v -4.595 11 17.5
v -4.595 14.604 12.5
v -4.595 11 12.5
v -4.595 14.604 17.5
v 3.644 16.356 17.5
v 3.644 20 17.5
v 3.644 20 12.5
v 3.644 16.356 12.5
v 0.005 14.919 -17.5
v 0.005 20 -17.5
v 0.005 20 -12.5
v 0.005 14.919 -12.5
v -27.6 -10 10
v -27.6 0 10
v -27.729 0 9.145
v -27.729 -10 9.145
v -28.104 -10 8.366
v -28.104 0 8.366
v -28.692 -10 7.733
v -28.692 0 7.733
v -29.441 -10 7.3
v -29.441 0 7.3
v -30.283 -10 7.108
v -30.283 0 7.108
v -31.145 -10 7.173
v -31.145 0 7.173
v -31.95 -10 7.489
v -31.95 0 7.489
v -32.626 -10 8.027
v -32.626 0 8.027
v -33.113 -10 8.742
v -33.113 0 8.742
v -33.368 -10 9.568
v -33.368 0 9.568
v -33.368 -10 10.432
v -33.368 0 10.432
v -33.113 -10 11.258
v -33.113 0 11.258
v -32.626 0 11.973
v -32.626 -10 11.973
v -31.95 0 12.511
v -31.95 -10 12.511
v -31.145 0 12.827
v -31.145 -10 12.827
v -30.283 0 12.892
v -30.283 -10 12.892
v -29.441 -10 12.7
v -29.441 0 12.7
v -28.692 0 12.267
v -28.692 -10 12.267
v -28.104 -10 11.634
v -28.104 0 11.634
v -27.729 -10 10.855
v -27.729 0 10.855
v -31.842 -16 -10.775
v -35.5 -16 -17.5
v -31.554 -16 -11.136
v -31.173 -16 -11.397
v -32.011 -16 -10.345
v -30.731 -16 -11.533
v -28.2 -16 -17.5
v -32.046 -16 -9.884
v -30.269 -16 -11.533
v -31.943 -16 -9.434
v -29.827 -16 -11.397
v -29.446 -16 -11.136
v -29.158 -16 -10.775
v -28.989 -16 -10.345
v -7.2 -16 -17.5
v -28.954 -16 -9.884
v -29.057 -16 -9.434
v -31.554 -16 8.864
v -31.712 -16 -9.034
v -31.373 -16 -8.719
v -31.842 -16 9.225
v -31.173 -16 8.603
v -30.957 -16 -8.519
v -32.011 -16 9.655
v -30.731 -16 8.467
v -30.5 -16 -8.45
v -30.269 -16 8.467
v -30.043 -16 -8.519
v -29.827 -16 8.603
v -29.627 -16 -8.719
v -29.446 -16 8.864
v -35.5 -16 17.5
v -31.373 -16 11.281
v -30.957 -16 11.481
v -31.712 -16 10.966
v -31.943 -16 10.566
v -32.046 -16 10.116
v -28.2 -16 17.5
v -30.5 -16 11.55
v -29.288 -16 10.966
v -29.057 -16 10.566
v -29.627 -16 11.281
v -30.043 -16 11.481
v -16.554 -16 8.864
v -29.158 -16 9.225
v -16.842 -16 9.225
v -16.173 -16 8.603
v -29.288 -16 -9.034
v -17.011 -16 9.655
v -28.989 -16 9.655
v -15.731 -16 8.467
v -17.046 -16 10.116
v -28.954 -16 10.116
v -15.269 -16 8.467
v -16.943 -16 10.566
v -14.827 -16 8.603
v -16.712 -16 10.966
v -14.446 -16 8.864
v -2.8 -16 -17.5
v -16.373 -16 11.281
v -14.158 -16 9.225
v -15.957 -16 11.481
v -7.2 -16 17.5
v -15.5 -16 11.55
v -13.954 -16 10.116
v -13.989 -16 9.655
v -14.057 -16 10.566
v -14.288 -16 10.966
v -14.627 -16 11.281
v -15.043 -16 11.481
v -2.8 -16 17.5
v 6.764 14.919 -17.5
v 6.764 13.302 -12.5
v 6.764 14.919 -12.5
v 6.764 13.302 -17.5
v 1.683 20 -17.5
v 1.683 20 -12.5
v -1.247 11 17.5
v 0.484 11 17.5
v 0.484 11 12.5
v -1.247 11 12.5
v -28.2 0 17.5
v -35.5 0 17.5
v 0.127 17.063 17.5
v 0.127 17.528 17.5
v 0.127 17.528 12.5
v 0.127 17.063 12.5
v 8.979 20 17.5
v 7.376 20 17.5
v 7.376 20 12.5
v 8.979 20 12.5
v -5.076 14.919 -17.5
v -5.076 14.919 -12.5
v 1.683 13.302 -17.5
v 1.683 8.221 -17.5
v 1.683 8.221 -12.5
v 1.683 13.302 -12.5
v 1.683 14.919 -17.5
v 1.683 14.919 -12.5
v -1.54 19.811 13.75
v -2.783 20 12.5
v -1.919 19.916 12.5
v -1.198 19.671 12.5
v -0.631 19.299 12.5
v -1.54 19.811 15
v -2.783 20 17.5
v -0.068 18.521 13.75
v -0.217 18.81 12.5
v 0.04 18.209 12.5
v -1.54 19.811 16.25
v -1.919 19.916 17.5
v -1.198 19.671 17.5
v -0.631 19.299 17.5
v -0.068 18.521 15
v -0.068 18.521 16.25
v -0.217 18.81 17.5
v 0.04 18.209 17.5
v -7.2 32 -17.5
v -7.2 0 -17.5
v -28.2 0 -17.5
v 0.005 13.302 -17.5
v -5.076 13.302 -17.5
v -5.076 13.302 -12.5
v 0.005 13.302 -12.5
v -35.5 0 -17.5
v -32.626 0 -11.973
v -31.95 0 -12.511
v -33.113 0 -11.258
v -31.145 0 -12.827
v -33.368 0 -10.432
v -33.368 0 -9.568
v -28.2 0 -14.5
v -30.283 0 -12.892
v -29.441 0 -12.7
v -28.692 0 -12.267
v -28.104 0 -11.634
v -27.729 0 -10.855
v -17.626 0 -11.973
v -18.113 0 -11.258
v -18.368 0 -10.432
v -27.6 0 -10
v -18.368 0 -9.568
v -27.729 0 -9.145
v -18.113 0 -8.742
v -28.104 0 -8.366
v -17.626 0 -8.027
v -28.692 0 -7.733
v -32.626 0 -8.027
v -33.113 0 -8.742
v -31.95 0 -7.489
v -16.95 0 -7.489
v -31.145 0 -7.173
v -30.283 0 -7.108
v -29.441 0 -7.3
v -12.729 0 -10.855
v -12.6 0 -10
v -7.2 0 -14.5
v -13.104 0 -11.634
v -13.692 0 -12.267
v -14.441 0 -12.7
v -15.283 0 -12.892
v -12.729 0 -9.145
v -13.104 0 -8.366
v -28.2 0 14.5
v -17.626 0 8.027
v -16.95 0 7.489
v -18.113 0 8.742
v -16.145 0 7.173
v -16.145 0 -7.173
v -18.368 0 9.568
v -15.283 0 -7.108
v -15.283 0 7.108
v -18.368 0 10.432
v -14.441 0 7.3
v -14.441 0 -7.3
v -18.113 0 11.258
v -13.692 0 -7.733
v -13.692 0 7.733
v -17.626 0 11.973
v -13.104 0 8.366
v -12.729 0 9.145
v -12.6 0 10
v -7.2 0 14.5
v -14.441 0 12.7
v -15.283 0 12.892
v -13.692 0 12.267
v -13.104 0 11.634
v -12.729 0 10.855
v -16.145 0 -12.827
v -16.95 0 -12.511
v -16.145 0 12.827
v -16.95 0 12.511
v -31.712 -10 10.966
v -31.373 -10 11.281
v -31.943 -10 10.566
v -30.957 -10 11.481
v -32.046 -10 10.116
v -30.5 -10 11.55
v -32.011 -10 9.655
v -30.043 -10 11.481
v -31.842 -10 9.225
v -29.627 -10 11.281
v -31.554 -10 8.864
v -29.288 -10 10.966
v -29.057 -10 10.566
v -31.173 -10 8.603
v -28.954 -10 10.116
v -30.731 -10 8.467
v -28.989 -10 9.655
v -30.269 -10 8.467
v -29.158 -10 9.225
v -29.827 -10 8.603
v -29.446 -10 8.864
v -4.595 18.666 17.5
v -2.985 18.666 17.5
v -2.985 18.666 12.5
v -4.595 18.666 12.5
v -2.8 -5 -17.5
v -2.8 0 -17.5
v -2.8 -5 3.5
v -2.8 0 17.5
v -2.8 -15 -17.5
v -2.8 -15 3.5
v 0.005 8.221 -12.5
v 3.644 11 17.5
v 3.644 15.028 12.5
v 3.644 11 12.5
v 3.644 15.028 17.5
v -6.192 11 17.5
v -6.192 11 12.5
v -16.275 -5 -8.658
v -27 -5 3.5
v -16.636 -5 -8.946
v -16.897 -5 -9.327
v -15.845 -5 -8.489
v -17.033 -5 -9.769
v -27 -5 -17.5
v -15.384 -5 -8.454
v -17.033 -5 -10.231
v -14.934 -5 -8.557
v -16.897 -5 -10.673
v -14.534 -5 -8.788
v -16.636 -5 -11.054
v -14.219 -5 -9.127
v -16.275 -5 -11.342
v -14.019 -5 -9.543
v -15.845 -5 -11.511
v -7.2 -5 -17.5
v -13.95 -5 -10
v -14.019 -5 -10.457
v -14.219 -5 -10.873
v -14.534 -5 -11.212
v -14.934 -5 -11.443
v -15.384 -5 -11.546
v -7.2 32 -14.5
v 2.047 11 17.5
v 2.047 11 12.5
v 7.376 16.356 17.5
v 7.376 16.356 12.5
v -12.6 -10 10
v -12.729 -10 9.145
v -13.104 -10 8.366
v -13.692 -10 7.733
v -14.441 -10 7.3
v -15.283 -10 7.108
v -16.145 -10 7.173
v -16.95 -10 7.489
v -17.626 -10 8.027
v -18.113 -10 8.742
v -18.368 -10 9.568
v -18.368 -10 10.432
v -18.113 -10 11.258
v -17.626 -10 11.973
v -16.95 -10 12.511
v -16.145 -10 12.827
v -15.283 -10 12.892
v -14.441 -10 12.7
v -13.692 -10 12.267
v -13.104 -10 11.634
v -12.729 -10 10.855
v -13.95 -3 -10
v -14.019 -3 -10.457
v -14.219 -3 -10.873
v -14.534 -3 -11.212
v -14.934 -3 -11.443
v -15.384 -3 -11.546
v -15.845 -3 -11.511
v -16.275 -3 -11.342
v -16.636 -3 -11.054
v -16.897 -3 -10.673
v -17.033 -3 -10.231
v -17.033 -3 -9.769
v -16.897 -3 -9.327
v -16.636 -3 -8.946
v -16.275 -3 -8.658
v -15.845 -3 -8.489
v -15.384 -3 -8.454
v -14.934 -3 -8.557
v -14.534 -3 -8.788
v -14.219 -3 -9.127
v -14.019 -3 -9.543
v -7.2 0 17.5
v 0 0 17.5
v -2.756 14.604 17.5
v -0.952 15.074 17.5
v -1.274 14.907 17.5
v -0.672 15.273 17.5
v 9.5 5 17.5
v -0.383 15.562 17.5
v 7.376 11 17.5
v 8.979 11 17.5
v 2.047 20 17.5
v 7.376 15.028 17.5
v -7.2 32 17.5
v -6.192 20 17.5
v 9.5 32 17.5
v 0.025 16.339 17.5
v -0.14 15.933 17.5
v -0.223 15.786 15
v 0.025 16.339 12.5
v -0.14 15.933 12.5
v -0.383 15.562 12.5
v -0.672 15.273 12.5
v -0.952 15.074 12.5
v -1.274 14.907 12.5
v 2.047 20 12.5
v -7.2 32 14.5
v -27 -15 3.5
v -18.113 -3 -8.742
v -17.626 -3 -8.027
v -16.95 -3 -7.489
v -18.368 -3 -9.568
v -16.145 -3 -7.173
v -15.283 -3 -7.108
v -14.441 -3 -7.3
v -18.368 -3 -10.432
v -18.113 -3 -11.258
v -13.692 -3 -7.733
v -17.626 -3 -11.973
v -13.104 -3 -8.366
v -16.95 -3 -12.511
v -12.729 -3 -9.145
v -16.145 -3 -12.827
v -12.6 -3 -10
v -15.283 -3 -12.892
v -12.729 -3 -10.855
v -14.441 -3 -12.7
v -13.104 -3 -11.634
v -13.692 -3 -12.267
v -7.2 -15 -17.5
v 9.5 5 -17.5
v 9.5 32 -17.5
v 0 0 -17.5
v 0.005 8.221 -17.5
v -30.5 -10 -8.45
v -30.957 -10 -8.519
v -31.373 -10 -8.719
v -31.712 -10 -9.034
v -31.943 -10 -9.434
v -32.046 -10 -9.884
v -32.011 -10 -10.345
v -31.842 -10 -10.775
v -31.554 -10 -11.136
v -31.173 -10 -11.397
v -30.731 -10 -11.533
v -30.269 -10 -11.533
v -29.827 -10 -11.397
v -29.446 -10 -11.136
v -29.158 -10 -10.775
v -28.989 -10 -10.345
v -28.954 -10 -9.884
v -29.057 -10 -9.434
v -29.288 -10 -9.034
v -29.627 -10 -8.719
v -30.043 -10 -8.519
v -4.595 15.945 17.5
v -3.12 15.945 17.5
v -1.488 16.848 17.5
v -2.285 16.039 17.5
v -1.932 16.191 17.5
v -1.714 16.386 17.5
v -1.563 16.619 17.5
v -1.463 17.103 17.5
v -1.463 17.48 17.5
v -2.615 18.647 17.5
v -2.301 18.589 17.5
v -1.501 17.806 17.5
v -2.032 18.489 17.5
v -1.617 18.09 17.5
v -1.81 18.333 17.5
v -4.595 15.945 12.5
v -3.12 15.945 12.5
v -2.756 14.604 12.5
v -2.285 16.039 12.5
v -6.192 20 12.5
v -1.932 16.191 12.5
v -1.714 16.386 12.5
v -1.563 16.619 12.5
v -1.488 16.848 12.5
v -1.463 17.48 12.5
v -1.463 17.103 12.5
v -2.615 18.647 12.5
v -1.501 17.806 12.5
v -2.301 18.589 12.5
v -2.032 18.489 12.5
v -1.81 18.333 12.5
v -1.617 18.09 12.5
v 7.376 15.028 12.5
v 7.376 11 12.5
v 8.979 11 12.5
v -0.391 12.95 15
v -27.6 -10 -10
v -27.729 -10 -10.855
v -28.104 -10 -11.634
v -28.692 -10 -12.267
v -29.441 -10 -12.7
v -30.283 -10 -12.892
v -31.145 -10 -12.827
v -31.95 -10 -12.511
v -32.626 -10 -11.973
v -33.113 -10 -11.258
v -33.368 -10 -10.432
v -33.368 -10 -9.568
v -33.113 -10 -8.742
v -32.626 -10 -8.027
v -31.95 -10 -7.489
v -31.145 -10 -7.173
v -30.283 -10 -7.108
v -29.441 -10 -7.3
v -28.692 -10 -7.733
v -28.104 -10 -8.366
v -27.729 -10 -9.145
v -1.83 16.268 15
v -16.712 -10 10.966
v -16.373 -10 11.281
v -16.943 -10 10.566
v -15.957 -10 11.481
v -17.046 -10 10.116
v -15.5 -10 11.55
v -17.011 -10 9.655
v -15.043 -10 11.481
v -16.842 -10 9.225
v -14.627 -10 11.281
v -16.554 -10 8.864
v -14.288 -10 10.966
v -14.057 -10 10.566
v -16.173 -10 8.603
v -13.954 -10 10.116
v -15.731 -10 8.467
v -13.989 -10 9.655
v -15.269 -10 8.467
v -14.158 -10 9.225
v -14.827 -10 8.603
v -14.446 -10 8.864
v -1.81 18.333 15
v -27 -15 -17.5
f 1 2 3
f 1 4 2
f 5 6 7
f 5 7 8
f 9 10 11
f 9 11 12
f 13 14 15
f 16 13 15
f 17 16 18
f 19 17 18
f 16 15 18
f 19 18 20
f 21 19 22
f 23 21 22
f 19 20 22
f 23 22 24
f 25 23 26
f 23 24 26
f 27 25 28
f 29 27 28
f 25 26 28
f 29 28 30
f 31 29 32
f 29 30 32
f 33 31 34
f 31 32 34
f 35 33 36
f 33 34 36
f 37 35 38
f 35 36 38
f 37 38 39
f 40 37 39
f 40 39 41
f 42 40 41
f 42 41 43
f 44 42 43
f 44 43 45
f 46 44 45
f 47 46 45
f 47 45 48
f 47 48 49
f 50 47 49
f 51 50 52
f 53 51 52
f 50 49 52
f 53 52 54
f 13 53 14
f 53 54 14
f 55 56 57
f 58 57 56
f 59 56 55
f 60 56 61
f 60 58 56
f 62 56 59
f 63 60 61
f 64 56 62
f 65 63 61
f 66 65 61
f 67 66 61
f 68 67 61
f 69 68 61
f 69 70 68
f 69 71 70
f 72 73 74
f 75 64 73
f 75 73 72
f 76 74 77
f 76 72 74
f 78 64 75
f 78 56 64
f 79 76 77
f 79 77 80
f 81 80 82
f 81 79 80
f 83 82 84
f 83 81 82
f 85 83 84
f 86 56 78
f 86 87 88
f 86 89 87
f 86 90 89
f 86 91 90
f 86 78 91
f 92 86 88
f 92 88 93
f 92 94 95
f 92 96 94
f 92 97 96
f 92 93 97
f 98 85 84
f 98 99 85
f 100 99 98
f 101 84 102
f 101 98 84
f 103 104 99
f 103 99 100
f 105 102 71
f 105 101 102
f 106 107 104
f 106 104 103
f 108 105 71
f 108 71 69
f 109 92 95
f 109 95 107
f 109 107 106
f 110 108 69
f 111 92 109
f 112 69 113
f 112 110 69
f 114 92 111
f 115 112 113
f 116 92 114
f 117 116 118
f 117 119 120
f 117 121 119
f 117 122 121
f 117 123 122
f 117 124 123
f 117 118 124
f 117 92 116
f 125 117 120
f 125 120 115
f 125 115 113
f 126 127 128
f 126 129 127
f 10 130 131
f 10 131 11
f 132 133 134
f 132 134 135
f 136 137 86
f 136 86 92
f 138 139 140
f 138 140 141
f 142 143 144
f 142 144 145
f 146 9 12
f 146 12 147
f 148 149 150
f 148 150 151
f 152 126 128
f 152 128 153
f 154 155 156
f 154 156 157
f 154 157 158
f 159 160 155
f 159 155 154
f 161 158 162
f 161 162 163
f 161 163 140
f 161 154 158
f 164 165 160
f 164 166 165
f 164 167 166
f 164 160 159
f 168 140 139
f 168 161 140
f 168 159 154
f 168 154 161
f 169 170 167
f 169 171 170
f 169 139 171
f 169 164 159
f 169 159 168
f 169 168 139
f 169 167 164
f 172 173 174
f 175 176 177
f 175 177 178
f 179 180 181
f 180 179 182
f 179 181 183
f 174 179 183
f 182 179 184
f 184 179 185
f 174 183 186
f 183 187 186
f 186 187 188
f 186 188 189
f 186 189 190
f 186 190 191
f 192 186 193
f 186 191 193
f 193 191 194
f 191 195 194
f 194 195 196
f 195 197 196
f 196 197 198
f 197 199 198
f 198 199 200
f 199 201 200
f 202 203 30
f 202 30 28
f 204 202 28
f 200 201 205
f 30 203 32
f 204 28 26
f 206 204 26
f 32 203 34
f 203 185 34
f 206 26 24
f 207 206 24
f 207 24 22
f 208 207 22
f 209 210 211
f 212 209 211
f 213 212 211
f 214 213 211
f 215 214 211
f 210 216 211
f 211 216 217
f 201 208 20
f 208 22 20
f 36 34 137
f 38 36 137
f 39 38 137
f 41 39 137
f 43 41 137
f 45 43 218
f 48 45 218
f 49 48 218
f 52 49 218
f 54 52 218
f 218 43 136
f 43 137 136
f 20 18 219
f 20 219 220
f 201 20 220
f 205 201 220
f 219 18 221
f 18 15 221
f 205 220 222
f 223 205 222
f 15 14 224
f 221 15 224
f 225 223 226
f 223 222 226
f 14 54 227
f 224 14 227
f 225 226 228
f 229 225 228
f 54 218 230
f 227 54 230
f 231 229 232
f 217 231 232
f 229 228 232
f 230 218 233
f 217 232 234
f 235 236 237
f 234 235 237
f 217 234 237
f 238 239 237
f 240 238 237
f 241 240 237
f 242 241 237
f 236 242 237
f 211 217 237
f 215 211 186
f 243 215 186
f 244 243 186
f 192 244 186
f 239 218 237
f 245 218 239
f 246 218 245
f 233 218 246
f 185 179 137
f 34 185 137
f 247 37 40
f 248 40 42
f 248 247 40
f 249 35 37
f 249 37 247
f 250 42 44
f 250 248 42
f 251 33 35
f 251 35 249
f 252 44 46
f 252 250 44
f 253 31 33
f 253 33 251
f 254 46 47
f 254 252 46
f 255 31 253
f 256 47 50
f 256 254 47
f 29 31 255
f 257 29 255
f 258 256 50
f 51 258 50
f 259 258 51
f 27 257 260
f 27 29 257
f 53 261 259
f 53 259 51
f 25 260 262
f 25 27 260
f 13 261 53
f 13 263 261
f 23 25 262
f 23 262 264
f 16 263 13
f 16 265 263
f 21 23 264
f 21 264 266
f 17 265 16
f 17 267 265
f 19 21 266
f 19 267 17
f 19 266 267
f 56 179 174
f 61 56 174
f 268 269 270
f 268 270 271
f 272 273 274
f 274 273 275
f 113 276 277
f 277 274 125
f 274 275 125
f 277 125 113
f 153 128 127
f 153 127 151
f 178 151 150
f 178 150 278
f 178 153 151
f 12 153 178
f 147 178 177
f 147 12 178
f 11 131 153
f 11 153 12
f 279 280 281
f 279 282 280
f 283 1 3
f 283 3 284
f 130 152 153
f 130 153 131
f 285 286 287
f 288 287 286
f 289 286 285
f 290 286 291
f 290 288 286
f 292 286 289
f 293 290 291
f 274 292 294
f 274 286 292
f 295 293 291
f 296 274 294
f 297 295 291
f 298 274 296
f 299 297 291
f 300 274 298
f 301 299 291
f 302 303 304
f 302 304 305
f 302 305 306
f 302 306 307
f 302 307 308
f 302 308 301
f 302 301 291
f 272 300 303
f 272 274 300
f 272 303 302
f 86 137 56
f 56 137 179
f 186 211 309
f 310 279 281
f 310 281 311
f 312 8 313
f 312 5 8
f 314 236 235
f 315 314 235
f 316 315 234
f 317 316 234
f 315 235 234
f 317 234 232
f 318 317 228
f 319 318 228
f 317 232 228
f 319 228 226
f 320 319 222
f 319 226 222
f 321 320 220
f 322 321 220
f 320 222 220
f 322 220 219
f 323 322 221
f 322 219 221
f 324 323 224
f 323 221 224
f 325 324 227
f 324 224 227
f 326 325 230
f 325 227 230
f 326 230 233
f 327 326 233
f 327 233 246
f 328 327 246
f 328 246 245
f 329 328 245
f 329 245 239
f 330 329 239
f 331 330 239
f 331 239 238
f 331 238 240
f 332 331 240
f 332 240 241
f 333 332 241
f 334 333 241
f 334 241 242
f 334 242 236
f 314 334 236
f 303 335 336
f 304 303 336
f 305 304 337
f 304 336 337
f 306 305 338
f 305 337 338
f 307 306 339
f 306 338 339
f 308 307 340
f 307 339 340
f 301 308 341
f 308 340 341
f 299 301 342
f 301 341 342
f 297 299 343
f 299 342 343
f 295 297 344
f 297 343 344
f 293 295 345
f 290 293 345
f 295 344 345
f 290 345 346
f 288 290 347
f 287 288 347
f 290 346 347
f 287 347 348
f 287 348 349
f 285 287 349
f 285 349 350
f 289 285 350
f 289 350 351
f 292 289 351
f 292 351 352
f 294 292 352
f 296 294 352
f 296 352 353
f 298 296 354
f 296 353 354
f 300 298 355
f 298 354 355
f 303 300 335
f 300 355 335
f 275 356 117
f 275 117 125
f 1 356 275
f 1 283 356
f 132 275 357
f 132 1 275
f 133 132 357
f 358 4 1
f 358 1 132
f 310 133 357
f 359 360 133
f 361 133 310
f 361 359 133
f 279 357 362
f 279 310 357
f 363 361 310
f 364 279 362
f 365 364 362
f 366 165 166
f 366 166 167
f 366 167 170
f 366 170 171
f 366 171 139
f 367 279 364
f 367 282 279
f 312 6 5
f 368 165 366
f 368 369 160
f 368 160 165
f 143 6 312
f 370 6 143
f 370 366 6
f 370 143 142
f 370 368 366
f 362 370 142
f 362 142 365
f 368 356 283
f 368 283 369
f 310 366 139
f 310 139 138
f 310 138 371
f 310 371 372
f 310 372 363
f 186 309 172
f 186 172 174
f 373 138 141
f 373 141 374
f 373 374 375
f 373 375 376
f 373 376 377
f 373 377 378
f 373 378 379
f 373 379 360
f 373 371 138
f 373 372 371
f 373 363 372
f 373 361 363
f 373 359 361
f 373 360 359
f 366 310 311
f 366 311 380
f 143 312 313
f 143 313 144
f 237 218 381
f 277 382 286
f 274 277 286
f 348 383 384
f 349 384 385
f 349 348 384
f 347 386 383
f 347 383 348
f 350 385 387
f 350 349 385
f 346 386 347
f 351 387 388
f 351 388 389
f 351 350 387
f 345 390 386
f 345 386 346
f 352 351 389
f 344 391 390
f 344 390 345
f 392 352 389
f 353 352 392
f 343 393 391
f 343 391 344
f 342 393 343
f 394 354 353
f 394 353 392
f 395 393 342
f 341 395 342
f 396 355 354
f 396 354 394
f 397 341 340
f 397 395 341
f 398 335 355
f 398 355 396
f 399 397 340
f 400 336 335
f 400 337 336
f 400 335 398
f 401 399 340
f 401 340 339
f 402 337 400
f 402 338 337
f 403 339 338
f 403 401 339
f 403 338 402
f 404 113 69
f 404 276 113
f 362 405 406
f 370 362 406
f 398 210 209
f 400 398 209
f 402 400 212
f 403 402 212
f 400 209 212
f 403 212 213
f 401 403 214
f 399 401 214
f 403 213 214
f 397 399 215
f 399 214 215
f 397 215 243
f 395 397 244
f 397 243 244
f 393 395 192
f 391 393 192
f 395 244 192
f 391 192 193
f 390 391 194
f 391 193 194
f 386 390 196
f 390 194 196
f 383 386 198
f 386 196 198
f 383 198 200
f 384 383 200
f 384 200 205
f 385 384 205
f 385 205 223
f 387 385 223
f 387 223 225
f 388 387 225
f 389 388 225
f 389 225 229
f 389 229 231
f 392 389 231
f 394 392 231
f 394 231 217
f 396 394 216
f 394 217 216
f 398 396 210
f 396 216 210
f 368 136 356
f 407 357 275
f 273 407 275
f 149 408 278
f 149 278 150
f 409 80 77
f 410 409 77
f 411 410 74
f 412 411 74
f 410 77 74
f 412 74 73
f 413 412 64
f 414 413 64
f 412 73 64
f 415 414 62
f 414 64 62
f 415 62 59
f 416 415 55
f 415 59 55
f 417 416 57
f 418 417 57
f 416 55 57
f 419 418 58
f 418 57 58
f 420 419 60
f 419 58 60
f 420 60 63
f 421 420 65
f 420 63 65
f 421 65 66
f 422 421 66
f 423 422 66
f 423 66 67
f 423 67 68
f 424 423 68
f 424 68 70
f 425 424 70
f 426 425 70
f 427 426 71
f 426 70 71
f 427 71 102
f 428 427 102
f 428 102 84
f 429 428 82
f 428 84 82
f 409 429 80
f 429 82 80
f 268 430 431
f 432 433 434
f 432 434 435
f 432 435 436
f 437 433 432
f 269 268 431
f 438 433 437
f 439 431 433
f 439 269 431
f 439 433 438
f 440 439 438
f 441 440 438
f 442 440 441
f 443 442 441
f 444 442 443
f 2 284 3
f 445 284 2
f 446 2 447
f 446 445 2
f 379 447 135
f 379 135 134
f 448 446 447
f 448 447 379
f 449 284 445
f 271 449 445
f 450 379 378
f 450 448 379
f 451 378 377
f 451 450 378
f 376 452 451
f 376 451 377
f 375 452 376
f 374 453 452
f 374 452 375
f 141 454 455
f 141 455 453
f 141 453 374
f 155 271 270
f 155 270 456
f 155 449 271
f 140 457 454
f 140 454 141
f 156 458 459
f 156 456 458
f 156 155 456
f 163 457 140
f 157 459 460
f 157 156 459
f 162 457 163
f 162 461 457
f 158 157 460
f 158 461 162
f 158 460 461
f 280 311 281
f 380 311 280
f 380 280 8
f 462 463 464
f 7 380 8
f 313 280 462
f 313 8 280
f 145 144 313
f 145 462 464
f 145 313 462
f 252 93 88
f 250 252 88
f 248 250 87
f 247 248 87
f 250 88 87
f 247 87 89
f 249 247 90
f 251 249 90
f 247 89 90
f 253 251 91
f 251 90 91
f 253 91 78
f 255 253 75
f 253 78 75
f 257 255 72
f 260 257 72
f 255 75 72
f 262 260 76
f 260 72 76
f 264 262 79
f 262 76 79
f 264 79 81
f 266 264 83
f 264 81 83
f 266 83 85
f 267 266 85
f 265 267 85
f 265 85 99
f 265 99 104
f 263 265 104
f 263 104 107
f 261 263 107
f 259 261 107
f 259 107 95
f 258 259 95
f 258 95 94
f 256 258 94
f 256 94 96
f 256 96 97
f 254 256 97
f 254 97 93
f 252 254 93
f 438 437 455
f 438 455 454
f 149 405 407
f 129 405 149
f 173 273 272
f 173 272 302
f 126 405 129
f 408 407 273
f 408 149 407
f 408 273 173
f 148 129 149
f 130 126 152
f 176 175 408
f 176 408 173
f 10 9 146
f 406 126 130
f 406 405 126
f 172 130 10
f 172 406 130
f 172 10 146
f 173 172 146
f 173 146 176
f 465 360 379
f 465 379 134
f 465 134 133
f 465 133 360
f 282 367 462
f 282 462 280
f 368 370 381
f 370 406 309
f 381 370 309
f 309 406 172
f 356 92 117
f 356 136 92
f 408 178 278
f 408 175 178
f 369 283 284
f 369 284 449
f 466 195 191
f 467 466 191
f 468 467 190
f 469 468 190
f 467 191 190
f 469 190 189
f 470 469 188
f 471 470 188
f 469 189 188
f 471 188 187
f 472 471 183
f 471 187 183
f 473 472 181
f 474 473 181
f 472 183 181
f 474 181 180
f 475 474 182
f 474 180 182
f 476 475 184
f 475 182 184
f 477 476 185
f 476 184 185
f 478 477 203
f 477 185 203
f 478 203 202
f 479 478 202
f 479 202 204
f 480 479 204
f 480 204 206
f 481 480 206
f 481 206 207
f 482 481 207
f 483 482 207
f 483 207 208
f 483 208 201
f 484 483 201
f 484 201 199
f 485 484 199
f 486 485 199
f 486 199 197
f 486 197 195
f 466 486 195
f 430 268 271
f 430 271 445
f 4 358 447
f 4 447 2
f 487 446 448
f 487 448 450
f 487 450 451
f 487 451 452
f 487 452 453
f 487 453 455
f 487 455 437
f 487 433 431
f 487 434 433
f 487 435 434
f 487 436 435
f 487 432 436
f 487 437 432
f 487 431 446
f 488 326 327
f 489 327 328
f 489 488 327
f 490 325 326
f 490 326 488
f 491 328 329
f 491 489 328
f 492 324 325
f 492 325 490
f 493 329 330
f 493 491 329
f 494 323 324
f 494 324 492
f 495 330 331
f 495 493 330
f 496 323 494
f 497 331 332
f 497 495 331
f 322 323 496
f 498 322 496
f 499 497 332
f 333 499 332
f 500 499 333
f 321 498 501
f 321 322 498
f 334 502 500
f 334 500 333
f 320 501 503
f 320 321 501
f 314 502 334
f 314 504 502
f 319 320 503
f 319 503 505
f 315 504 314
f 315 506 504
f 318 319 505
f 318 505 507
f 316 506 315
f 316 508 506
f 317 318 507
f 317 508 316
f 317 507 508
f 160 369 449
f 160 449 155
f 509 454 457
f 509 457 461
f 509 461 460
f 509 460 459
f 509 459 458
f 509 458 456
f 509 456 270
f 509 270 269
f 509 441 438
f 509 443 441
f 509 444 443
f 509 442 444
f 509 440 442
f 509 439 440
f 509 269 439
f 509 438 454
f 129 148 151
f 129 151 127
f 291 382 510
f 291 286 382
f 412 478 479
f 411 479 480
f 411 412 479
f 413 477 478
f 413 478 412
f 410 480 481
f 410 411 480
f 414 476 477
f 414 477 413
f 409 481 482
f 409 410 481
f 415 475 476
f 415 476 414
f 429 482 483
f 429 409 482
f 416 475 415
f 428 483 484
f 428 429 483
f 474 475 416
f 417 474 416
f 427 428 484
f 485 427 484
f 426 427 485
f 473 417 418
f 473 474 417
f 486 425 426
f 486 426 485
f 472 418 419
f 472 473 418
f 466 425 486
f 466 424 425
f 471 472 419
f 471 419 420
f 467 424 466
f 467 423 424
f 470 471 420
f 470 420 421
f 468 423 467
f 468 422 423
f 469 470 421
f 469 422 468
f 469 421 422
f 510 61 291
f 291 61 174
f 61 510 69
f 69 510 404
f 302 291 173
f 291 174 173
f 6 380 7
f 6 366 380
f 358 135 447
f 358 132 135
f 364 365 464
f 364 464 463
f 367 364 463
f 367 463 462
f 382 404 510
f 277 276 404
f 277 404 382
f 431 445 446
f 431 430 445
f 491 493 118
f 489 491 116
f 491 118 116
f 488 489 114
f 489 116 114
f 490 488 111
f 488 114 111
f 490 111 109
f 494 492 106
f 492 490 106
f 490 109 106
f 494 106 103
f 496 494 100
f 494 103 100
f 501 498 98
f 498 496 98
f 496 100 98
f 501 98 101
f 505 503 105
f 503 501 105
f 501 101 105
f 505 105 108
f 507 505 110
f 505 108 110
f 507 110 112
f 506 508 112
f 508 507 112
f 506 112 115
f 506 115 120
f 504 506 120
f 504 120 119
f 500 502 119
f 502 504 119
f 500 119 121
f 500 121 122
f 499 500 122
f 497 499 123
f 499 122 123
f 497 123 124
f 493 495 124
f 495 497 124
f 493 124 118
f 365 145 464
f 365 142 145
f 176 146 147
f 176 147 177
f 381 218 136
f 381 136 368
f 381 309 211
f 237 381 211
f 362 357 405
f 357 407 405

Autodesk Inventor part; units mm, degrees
ref_plane "YZ Plane" through (0, 0, 0) normal (1, 0, 0) x (0, 1, 0)
ref_plane "XZ Plane" through (0, 0, 0) normal (0, 1, 0) x (-1, 0, 0)
sketch "Sketch1" plane through (0, 0, 0) normal (0, 0, 1) x (1, 0, 0)
  line L0 (-7.2, 32) -> (-7.2, 0)
  line L1 (-7.2, 0) -> (0, 0)
  line L2 (0, 0) -> (9.5, 5)
  line L3 (9.5, 5) -> (9.5, 32)
  line L4 (9.5, 32) -> (-7.2, 32)
  dimension "d0" = 32
  dimension "d2" = 7.2
  dimension "d55" = 9.5
  dimension "d57" = 27
extrude "Extrusion1" add sketch "Sketch1" along normal mid plane 35
ref_plane "Work Plane1" through (0, 0, 15.9999) normal (0, 0, 1) x (1, 0, 0)
sketch "Sketch2" plane through (0, 0, 15.9999) normal (0, 0, 1) x (1, 0, 0)
  line L0 (-7.2, 32) -> (-7.2, 0) projected
  line L1 (-7.2, 0) -> (0, 0) projected
  line L2 (-7.2, 0) -> (-28.2, 0)
  line L3 (-7.2, 0) -> (13.8, 0) construction
  line L4 (0, 0) -> (9.5, 5) projected
  line L5 (9.5, 5) -> (9.5, 32) projected
  line L6 (9.5, 32) -> (-7.2, 32) projected
  line L7 (-28.2, 0) -> (-7.2, 32)
  line L8 (-7.2, 0) -> (-7.2, 32)
  dimension "d9" = 21
  dimension "d10" = 180
  dimension "d88" = 32
extrude "Extrusion2" add sketch "Sketch2" along normal mid plane 3 contours L0 L2 L7
mirror "Mirror1" about plane through (0, 0, 0) normal (0, 0, 1) of "Extrusion2"
sketch "Sketch3" plane through (-7.2, 0, 17.5) normal (0, -1, 0) x (1, 0, 0)
  line L0 (-42.8, 2) -> (-18.0727, 11)
  line L1 (-18.0727, 11) -> (7.2, 11)
  line L2 (7.2, 11) -> (7.2, -46)
  line L3 (-42.8, 2) -> (-42.8, -37)
  line L4 (-42.8, -37) -> (-18.0727, -46)
  line L5 (-18.0727, -46) -> (7.2, -46)
  line L6 (7.2, -35) -> (7.2, 0) projected
  line L7 (7.2, -35) -> (7.2, 0) projected
  line L8 (0, 0) -> (0, -0.0001) projected
  line L9 (7.2, -35) -> (0, -35) projected
  line L10 (0, 0) -> (7.2, 0) projected
  line L11 (-21, -0.0001) -> (0, -0.0001) projected
  line L12 (-21, -3.0001) -> (-21, -0.0001) projected
  line L13 (0, -3.0001) -> (-21, -3.0001) projected
  line L14 (0, -3.0001) -> (0, -31.9999) projected
  line L15 (0, -31.9999) -> (-21, -31.9999) projected
  line L16 (-21, -31.9999) -> (-21, -34.9999) projected
  line L17 (-21, -34.9999) -> (0, -34.9999) projected
  line L18 (0, -34.9999) -> (0, -35) projected
  point P0 (7.2, -17.5)
  point P1 (-5.4364, 11)
  point P2 (7.2, -17.5)
  point P3 (7.2, -17.5)
  point P4 (7.2, -17.5)
  point P5 (-5.4364, -46)
  point P6 (-42.8, -17.5)
  point P7 (7.2, -17.5)
  point P8 (7.2, -35)
  point P9 (7.2, 0)
  dimension "d17" = 57
  dimension "d18" = 39
  dimension "d19" = 9
  dimension "d20" = 9
  dimension "d21" = 50
  dimension "d76" = 110
extrude "Extrusion3" add sketch "Sketch3" along normal blind 16
sketch "Sketch4" plane through (-7.2, 0, 17.5) normal (0, 1, 0) x (1, 0, 0)
  line L0 (7.2, 17.5) -> (-27.8, 17.5) construction
  line L1 (-23.3, 7.5) -> (-8.3, 7.5) construction
  line L2 (-23.3, 27.5) -> (-23.3, 7.5) construction
  line L3 (7.2, 35) -> (0, 35) projected
  line L4 (7.2, 46) -> (7.2, 35) projected
  line L5 (-18.0727, 46) -> (7.2, 46) projected
  line L6 (-42.8, 37) -> (-18.0727, 46) projected
  line L7 (-42.8, -2) -> (-42.8, 37) projected
  line L8 (-18.0727, -11) -> (-42.8, -2) projected
  line L9 (7.2, -11) -> (-18.0727, -11) projected
  line L10 (7.2, 0) -> (7.2, -11) projected
  line L11 (0, 0) -> (7.2, 0) projected
  line L12 (0, 0) -> (0, 0.0001) projected
  line L13 (-21, 0.0001) -> (0, 0.0001) projected
  line L14 (-21, 3.0001) -> (-21, 0.0001) projected
  line L15 (0, 3.0001) -> (-21, 3.0001) projected
  line L16 (0, 3.0001) -> (0, 31.9999) projected
  line L17 (0, 31.9999) -> (-21, 31.9999) projected
  line L18 (-21, 31.9999) -> (-21, 34.9999) projected
  line L19 (-21, 34.9999) -> (0, 34.9999) projected
  line L20 (0, 34.9999) -> (0, 35) projected
  point P0 (-23.3, 17.5)
  point P1 (-10.3, 17.5)
  dimension "d26" = 15
  dimension "d27" = 20
  dimension "d58" = 13
  dimension "d59" = 19.5
hole "Hole1" at (-30.5, 0, 10) at (-15.5, 0, 10) at (-30.5, 0, -10) direction (0, -1, 0) diameter 3.1 end through all
sketch "Sketch5" plane through (0, 0, -17.5) normal (1, 0, 0) x (0, 0, -1)
  line L0 (11, 0) -> (0, 0) projected
  line L1 (-35, 0) -> (-46, 0) projected
  line L2 (-46, 0) -> (-46, -16) projected
  line L3 (11, -16) -> (-46, -16) projected
  line L4 (11, 0) -> (11, -16) projected
  line L5 (-46, 0) -> (-46, -16) projected
  line L6 (-21, -5) -> (9, -5)
  line L7 (9, -5) -> (9, -15)
  line L8 (9, -15) -> (-21, -15)
  line L9 (-21, -15) -> (-21, -5)
  line L10 (0, 0) -> (-35, 0) projected
  point P0 (-17.5, 0)
  point P1 (-17.5, 0)
  point P2 (-46, -8)
  point P3 (-46, -8)
  point P4 (11, -12.5)
  point P5 (11, -2.5)
  dimension "d46" = 30
  dimension "d47" = 10
  dimension "d48" = 2
  dimension "d49" = 5
extrude "Extrusion4" cut sketch "Sketch5" against normal blind 27 contours L6 L7 L8 L9
sketch "Sketch6" plane through (-7.2, 0, 17.5) normal (0, 1, 0) x (1, 0, 0)
  circle A0 centre (-23.3, 27.5) radius 1.55 projected
  circle A1 centre (-8.3, 7.5) radius 1.55 projected
  circle A2 centre (-23.3, 7.5) radius 1.55 projected
  line L0 (7.2, 35) -> (0, 35) projected
  line L1 (7.2, 46) -> (7.2, 35) projected
  line L2 (-18.0727, 46) -> (7.2, 46) projected
  line L3 (-42.8, 37) -> (-18.0727, 46) projected
  line L4 (-42.8, -2) -> (-42.8, 37) projected
  line L5 (-18.0727, -11) -> (-42.8, -2) projected
  line L6 (7.2, -11) -> (-18.0727, -11) projected
  line L7 (7.2, 0) -> (7.2, -11) projected
  line L8 (0, 0) -> (7.2, 0) projected
  line L9 (0, 0) -> (0, 0.0001) projected
  circle A3 centre (-8.3, 27.5) radius 2.9
  line L10 (-21, 0.0001) -> (0, 0.0001) projected
  line L11 (-21, 3.0001) -> (-21, 0.0001) projected
  line L12 (0, 3.0001) -> (-21, 3.0001) projected
  line L13 (0, 3.0001) -> (0, 31.9999) projected
  line L14 (0, 31.9999) -> (-21, 31.9999) projected
  line L15 (-21, 31.9999) -> (-21, 34.9999) projected
  line L16 (-21, 34.9999) -> (0, 34.9999) projected
  line L17 (0, 34.9999) -> (0, 35) projected
  point P0 (7.2, 17.5)
  dimension "d41" = 5.8
  dimension "d42" = 15
  dimension "d43" = 20
extrude "Extrusion5" cut sketch "Sketch6" against normal blind 3 contours A3
sketch "Sketch8" plane through (0, 0, 17.5) normal (0, 0, 1) x (1, 0, 0)
  line L0 (-7.2, 0) -> (0, 0) projected
  line L1 (0, 0) -> (9.5, 5) projected
  line L2 (9.5, 5) -> (9.5, 32) projected
  line L3 (9.5, 32) -> (-7.2, 32) projected
  line L4 (-7.2, 32) -> (-7.2, 0) projected
  line L5 (-7.2021, 20) -> (7.8, 20) construction
  line L6 (7.8, 20) -> (7.8, 7.2072) construction
  line L7 (7.8, 7.2072) -> (-7.2021, 7.2072) construction
  line L8 (-7.2021, 7.2072) -> (-7.2021, 20) construction
  line L9 (-2.756, 14.604) -> (-4.5951, 14.604)
  line L10 (-4.5951, 14.604) -> (-4.5951, 11)
  line L11 (-4.5951, 11) -> (-6.1916, 11)
  line L12 (-6.1916, 11) -> (-6.1916, 20)
  line L13 (-6.1916, 20) -> (-2.7829, 20)
  spline S0 degree 2 poles (-2.7829, 20) (-2.0823, 20) (-0.9978, 19.6228) (-0.2635, 18.976) (0.1272, 18.0666) (0.1272, 17.5277) knots 0 0 0 1 2 3 4 4 4
  line L14 (0.1272, 17.5277) -> (0.1272, 17.0629)
  spline S1 degree 2 poles (0.1272, 17.0629) (0.1272, 16.3555) (-0.5734, 15.2171) (-1.274, 14.9072) knots 0 0 0 1 2 2 2
  spline S2 degree 2 poles (-1.274, 14.9072) (-0.8226, 13.9169) (0.0397, 11.9835) (0.4843, 11) knots 0 0 0 1 2 2 2
  line L15 (0.4843, 11) -> (-1.247, 11)
  line L16 (-1.247, 11) -> (-2.756, 14.604)
  line L17 (-4.5951, 18.6662) -> (-4.5951, 15.9446)
  line L18 (-4.5951, 15.9446) -> (-3.1198, 15.9446)
  spline S3 degree 2 poles (-3.1198, 15.9446) (-2.1969, 15.9446) (-1.4626, 16.5913) (-1.4626, 17.1033) knots 0 0 0 1 2 2 2
  line L19 (-1.4626, 17.1033) -> (-1.4626, 17.4805)
  spline S4 degree 2 poles (-1.4626, 17.4805) (-1.4626, 17.9993) (-2.1564, 18.6662) (-2.985, 18.6662) knots 0 0 0 1 2 2 2
  line L20 (-2.985, 18.6662) -> (-4.5951, 18.6662)
  line L21 (7.3757, 15.0284) -> (3.6437, 15.0284)
  line L22 (3.6437, 15.0284) -> (3.6437, 11)
  line L23 (3.6437, 11) -> (2.0472, 11)
  line L24 (2.0472, 11) -> (2.0472, 20)
  line L25 (2.0472, 20) -> (3.6437, 20)
  line L26 (3.6437, 20) -> (3.6437, 16.3555)
  line L27 (3.6437, 16.3555) -> (7.3757, 16.3555)
  line L28 (7.3757, 16.3555) -> (7.3757, 20)
  line L29 (7.3757, 20) -> (8.979, 20)
  line L30 (8.979, 20) -> (8.979, 11)
  line L31 (8.979, 11) -> (7.3757, 11)
  line L32 (7.3757, 11) -> (7.3757, 15.0284)
  point P0 (-7, 15)
  dimension "d68" = 12
  dimension "d69" = 15
extrude "Extrusion7" cut sketch "Sketch8" against normal blind 5 contours L9 L10 L11 L12 L13 S0 L14 S1 S2 L15 L16 | L21 L22 L23 L24 L25 L26 L27 L28 L29 L30 L31 L32
sketch "Sketch9" plane through (0, 0, -17.5) normal (0, 0, -1) x (-1, 0, 0)
  line L0 (-2.0472, 11) -> (-2.0472, 20) projected
  line L1 (0, 0) -> (7.2, 0) projected
  line L2 (7.2, 0) -> (7.2, 32) projected
  line L3 (7.2, 32) -> (-9.5, 32) projected
  line L4 (-9.5, 32) -> (-9.5, 5) projected
  line L5 (-9.5, 5) -> (0, 0) projected
  line L6 (-8.356, 20) -> (-4.8532, 20) construction
  line L7 (-4.8532, 20) -> (-4.8532, 17.8281) construction
  line L8 (-4.8532, 17.8281) -> (-8.356, 17.8281) construction
  line L9 (-8.356, 17.8281) -> (-8.356, 20) construction
  line L10 (5.5, 50.4054) -> (5.5, 41.2692)
  line L11 (5.0759, 13.3023) -> (-0.0051, 13.3023)
  line L12 (-0.0051, 13.3023) -> (-0.0051, 8.2212)
  line L13 (-0.0051, 8.2212) -> (-1.6826, 8.2212)
  line L14 (-1.6826, 8.2212) -> (-1.6826, 13.3023)
  line L15 (-1.6826, 13.3023) -> (-6.7636, 13.3023)
  line L16 (-6.7636, 13.3023) -> (-6.7636, 14.919)
  line L17 (-6.7636, 14.919) -> (-1.6826, 14.919)
  line L18 (-1.6826, 14.919) -> (-1.6826, 20)
  line L19 (-1.6826, 20) -> (-0.0051, 20)
  line L20 (-0.0051, 20) -> (-0.0051, 14.919)
  line L21 (-0.0051, 14.919) -> (5.0759, 14.919)
  line L22 (5.0759, 14.919) -> (5.0759, 13.3023)
  dimension "d72" = 12
  dimension "d73" = 15
extrude "Extrusion8" cut sketch "Sketch9" against normal blind 5 contours L15 L16 L17 L0 | L0 L17 L18 L19 L20 L21 L22 L11 L12 L13 L14 L15
sketch "Sketch10" plane through (-7.2, 0, 17.5) normal (0, 1, 0) x (1, 0, 0)
  line L0 (-30.65, 19.5) -> (4.05, 19.5) projected
  circle A0 centre (-23.3, 27.5) radius 1.55 projected
  circle A1 centre (-23.3, 7.5) radius 1.55 projected
  circle A2 centre (-8.3, 7.5) radius 1.55 projected
  circle A3 centre (-23.3, 27.5) radius 2.9
  circle A4 centre (-23.3, 7.5) radius 2.9
  circle A5 centre (-8.3, 7.5) radius 2.9
  point P0 (7.2, 17.5)
  dimension "d77" = 5.8
  dimension "d78" = 5.8
  dimension "d79" = 5.8
extrude "Extrusion9" cut sketch "Sketch10" against normal blind 10 contours A0 | A1 | A3 | A4 | A5
sketch "Sketch12" plane through (-7.2, 0, 17.5) normal (0, 1, 0) x (1, 0, 0)
  circle A0 centre (-8.3, 27.5) radius 2.9 projected
  circle A1 centre (-8.3, 27.5) radius 1.55
  point P0 (7.2, 17.5)
  dimension "d85" = 3.1
extrude "Extrusion11" cut sketch "Sketch12" against normal up to surface (5 mm away) contours A1
sketch "Sketch13" plane through (-7.2, 0, 17.5) normal (0, 1, 0) x (1, 0, 0)
  circle A0 centre (-8.3, 7.5) radius 2.9 projected
  circle A1 centre (-23.3, 27.5) radius 2.9 projected
  circle A2 centre (-23.3, 7.5) radius 2.9 projected
  circle A3 centre (-8.3, 27.5) radius 2.9 projected
  line L0 (7.2, 35) -> (0, 35) projected
  line L1 (7.2, 46) -> (7.2, 35) projected
  line L2 (-18.0727, 46) -> (7.2, 46) projected
  line L3 (-42.8, 37) -> (-18.0727, 46) projected
  line L4 (-42.8, -2) -> (-42.8, 37) projected
  line L5 (-18.0727, -11) -> (-42.8, -2) projected
  line L6 (7.2, -11) -> (-18.0727, -11) projected
  line L7 (7.2, 0) -> (7.2, -11) projected
  line L8 (0, 0) -> (7.2, 0) projected
  line L9 (0, 0) -> (0, 0.0001) projected
  line L10 (-21, 0.0001) -> (0, 0.0001) projected
  line L11 (-21, 3.0001) -> (-21, 0.0001) projected
  line L12 (0, 3.0001) -> (-21, 3.0001) projected
  line L13 (0, 3.0001) -> (0, 31.9999) projected
  line L14 (0, 31.9999) -> (-21, 31.9999) projected
  line L15 (-21, 31.9999) -> (-21, 34.9999) projected
  line L16 (-21, 34.9999) -> (0, 34.9999) projected
  line L17 (0, 34.9999) -> (0, 35) projected
  line L18 (7.2, -11) -> (-42.8, -11)
  line L19 (-42.8, -11) -> (-42.8, 0)
  line L20 (-42.8, 0) -> (7.2, 0)
  line L21 (7.2, 0) -> (7.2, -11)
  line L22 (7.2, 46) -> (-42.8, 46)
  line L23 (-42.8, 46) -> (-42.8, 35)
  line L24 (-42.8, 35) -> (7.2, 35)
  line L25 (7.2, 35) -> (7.2, 46)
  point P0 (7.2, 17.5)
  point P1 (7.2, 40.5)
  dimension "d89" = 11
  dimension "d92" = 11
  dimension "d93" = 50
extrude "Extrusion12" cut sketch "Sketch13" against normal blind 30 contours L0 L16 L24 L4 L3 L2 L1 | L20 L10 L8 L7 L6 L5 L4
sketch "Sketch14" plane through (-7.2, 0, 17.5) normal (0, 1, 0) x (1, 0, 0)
  line L0 (-42.8, 0) -> (0, 0) projected
  line L1 (0, 0) -> (0, 0.0001) projected
  line L2 (-21, 0.0001) -> (0, 0.0001) projected
  line L3 (-21, 3.0001) -> (-21, 0.0001) projected
  line L4 (0, 3.0001) -> (-21, 3.0001) projected
  line L5 (0, 3.0001) -> (0, 31.9999) projected
  line L6 (0, 31.9999) -> (-21, 31.9999) projected
  line L7 (-21, 31.9999) -> (-21, 34.9999) projected
  line L8 (-21, 34.9999) -> (0, 34.9999) projected
  line L9 (0, 34.9999) -> (0, 35) projected
  line L10 (0, 35) -> (-42.8, 35) projected
  line L11 (-42.8, 0) -> (-42.8, 35) projected
  circle A0 centre (-8.3, 7.5) radius 2.9 projected
  circle A1 centre (-23.3, 27.5) radius 2.9 projected
  circle A2 centre (-23.3, 7.5) radius 2.9 projected
  circle A3 centre (-8.3, 27.5) radius 2.9 projected
  line L12 (-42.8, 0) -> (-28.3, 0)
  line L13 (-28.3, 0) -> (-28.3, 35)
  line L14 (-28.3, 35) -> (-42.8, 35)
  line L15 (-42.8, 35) -> (-42.8, 0)
  point P0 (7.2, 17.5)
  point P1 (-28.3, 0)
  dimension "d94" = 5
extrude "Extrusion13" cut sketch "Sketch14" against normal through all contours L11 L10 L13 L0
sketch "Sketch15" plane through (0, 0, 17.5) normal (0, 0, 1) x (1, 0, 0)
  line L0 (-1.247, 11) -> (-2.756, 14.604) projected
  line L1 (-2.756, 14.604) -> (-4.5951, 14.604) projected
  line L2 (-4.5951, 14.604) -> (-4.5951, 11) projected
  line L3 (-4.5951, 11) -> (-6.1916, 11) projected
  line L4 (-6.1916, 11) -> (-6.1916, 20) projected
  line L5 (-6.1916, 20) -> (-2.7829, 20) projected
  line L6 (0.1272, 17.5277) -> (0.1272, 17.0629) projected
  line L7 (0.4843, 11) -> (-1.247, 11) projected
  line L8 (7.3757, 11) -> (7.3757, 15.0284) projected
  line L9 (7.3757, 15.0284) -> (3.6437, 15.0284) projected
  line L10 (3.6437, 15.0284) -> (3.6437, 11) projected
  line L11 (3.6437, 11) -> (2.0472, 11) projected
  line L12 (2.0472, 11) -> (2.0472, 20) projected
  line L13 (2.0472, 20) -> (3.6437, 20) projected
  line L14 (3.6437, 20) -> (3.6437, 16.3555) projected
  line L15 (3.6437, 16.3555) -> (7.3757, 16.3555) projected
  line L16 (7.3757, 16.3555) -> (7.3757, 20) projected
  line L17 (7.3757, 20) -> (8.979, 20) projected
  line L18 (8.979, 20) -> (8.979, 11) projected
  line L19 (8.979, 11) -> (7.3757, 11) projected
  line L20 (-35.5, 0) -> (-35.5, -16) projected
  line L21 (0, -16) -> (-35.5, -16) projected
  line L22 (0, 0) -> (0, -16) projected
  line L23 (0, 0) -> (9.5, 5) projected
  line L24 (9.5, 5) -> (9.5, 32) projected
  line L25 (9.5, 32) -> (-7.2, 32) projected
  line L26 (-7.2, 32) -> (-7.2, 0) projected
  line L27 (-35.5, 0) -> (-7.2, 0) projected
  line L28 (0, 0) -> (-2.8, 0)
  line L29 (-2.8, 0) -> (-2.8, -16)
  line L30 (-2.8, -16) -> (0, -16)
  line L31 (0, -16) -> (0, 0)
  point P0 (-1.274, 14.9072)
  dimension "d97" = 2.8
extrude "Extrusion14" cut sketch "Sketch15" against normal up to surface (35 mm away) contours L29 L28 L22 L21
properties part number "gripper" material "ABS Plastic"
